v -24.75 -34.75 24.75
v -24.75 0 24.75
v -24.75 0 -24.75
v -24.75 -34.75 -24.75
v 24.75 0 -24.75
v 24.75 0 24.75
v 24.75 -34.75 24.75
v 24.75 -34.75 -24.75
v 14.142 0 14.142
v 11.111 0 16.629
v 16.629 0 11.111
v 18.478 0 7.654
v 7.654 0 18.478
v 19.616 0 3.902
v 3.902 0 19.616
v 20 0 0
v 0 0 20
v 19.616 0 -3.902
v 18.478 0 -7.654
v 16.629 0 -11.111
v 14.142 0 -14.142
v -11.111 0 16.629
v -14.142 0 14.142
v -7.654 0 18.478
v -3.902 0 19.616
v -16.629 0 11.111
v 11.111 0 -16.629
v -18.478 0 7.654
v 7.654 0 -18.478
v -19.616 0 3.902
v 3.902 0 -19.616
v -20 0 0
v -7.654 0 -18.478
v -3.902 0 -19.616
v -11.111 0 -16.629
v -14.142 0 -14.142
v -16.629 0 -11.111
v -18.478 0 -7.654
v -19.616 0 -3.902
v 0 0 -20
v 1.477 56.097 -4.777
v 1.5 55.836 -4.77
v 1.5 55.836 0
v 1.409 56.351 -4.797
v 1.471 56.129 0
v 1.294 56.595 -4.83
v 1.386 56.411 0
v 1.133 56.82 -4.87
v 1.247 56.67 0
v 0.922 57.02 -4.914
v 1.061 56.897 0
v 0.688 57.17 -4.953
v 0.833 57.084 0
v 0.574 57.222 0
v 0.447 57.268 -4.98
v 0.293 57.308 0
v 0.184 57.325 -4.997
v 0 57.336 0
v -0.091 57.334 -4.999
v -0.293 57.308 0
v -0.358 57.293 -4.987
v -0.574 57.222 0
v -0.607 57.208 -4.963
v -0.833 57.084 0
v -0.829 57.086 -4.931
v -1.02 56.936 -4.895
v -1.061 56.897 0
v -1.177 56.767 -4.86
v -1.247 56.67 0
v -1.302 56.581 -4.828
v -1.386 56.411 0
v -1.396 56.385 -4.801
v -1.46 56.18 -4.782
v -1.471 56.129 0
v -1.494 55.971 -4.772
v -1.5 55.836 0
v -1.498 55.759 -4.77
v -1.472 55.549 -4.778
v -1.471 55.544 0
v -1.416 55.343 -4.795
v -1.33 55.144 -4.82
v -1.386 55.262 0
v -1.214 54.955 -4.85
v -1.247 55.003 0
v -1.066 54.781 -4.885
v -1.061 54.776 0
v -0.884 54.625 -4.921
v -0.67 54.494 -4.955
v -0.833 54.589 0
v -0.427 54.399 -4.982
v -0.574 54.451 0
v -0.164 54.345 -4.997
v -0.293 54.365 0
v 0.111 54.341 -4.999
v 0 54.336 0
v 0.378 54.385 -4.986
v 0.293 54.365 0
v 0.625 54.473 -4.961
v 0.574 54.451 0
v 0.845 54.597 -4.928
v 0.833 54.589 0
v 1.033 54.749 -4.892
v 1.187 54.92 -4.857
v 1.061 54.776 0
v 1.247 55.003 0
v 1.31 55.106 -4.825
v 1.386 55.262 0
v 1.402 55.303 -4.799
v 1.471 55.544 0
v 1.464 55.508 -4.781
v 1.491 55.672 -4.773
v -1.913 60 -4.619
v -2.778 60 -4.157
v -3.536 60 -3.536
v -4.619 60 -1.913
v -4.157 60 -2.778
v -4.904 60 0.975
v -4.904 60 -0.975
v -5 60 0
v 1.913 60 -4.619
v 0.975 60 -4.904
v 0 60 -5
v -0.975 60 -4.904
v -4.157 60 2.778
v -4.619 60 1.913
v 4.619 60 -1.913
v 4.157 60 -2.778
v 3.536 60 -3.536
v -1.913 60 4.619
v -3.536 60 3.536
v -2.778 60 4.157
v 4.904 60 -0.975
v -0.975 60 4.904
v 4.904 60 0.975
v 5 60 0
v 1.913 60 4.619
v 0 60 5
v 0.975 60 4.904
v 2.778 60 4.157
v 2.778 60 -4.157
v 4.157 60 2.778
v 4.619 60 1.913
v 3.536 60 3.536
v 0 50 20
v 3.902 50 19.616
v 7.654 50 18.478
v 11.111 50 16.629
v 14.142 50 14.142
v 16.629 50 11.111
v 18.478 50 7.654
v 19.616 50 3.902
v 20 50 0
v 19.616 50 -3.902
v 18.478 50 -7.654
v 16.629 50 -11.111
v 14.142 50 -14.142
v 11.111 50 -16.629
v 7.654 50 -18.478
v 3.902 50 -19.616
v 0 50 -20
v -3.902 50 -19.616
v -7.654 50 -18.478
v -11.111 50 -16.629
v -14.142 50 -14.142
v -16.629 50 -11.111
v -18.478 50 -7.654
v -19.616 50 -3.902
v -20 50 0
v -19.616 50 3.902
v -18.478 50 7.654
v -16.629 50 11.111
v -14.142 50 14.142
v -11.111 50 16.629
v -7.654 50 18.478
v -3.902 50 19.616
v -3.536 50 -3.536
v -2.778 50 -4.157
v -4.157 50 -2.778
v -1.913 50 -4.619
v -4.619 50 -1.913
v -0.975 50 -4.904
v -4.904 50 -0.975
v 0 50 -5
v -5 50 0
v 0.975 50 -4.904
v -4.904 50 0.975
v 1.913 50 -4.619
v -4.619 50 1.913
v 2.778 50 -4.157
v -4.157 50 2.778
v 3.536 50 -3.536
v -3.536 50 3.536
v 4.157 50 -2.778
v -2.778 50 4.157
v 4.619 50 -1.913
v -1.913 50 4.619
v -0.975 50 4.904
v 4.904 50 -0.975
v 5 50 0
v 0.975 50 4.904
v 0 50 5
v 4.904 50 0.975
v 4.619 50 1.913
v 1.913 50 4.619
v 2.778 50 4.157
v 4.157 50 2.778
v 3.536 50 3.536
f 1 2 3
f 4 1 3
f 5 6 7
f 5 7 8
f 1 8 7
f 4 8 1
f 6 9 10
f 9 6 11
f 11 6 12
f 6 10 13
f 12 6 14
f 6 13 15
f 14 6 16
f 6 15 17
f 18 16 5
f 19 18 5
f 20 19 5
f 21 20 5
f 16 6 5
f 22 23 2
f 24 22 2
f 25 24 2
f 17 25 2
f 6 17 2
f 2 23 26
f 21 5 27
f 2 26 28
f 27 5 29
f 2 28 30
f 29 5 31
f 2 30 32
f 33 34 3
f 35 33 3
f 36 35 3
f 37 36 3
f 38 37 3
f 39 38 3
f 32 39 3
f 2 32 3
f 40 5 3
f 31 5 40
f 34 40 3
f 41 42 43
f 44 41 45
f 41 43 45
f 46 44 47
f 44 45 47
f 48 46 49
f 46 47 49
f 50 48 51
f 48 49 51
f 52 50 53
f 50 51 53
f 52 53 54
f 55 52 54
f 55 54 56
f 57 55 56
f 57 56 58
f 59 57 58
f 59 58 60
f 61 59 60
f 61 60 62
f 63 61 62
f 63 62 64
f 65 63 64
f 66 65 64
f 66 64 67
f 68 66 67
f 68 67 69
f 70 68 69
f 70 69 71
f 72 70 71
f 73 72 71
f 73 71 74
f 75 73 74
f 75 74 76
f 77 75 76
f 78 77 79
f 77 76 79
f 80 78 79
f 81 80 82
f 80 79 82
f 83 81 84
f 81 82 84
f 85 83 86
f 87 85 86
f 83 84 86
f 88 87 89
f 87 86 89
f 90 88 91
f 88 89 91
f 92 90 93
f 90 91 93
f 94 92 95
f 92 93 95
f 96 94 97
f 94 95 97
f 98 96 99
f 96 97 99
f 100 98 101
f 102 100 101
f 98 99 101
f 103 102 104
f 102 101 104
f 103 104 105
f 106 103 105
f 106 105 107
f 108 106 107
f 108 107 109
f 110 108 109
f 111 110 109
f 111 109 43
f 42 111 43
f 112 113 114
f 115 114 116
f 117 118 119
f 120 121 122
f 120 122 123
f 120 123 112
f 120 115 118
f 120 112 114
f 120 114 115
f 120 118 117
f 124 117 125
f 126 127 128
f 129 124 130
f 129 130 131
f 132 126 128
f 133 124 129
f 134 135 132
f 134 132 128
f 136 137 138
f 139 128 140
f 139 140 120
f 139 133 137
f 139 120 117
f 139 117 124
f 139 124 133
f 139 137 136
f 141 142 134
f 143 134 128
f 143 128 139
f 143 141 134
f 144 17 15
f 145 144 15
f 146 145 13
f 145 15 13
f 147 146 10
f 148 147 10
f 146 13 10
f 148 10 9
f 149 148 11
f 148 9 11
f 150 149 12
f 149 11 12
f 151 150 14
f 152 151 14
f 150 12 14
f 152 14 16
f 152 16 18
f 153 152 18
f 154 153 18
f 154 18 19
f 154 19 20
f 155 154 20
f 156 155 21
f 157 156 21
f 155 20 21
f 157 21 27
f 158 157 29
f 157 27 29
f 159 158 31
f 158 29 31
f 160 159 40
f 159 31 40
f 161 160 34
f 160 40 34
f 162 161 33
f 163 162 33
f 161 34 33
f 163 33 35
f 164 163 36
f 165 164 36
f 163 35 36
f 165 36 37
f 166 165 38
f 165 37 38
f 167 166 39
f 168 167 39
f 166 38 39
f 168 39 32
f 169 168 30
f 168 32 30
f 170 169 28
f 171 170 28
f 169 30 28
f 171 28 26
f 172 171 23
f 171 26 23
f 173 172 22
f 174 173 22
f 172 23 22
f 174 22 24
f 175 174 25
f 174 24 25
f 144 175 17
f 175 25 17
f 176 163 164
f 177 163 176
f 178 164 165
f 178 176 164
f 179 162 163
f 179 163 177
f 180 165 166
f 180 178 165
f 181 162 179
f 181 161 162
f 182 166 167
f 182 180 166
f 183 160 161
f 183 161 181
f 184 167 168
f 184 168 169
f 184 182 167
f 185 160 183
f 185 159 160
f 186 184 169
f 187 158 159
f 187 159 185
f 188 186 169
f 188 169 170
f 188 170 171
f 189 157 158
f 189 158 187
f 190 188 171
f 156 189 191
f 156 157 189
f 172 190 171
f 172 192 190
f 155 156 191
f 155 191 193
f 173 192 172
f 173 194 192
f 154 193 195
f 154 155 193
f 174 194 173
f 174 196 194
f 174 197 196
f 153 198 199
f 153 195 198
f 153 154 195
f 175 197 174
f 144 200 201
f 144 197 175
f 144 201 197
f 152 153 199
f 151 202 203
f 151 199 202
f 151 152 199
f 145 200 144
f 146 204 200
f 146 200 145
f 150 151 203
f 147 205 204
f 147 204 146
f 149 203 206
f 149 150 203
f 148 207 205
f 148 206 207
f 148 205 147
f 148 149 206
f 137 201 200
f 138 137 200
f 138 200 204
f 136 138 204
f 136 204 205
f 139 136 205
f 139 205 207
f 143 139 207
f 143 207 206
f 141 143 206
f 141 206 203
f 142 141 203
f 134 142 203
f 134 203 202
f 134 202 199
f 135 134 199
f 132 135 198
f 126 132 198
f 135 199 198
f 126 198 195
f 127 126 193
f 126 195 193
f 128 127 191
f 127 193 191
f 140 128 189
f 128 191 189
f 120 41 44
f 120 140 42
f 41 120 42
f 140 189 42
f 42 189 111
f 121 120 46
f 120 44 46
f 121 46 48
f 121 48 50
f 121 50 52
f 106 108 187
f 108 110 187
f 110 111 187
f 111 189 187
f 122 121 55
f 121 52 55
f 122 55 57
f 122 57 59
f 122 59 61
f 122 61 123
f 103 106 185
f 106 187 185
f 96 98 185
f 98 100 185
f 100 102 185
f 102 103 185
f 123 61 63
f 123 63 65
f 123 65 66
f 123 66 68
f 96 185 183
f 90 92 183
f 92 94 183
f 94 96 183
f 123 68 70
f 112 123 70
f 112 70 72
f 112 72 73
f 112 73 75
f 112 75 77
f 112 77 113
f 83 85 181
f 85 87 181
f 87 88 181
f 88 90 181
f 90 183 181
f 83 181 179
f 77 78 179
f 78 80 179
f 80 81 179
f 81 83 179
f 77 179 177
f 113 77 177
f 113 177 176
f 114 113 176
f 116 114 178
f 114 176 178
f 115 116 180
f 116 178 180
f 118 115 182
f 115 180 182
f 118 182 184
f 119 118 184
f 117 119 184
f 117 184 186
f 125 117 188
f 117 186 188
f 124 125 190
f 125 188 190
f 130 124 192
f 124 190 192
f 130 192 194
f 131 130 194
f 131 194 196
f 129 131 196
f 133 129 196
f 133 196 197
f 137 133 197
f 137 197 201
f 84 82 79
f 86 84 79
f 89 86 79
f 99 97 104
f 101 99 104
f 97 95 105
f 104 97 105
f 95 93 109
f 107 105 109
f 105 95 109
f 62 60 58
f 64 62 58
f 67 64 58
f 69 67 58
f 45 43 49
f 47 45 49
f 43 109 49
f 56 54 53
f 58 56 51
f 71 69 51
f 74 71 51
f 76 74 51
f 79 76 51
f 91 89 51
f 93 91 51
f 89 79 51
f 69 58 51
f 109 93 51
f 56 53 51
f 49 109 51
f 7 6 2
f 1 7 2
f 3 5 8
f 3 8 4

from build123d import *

# Parameters (mm, degrees)
SKETCH1_R           = 20
BOSS_EXTRUDE1_DEPTH = 50
SKETCH2_R           = 5
BOSS_EXTRUDE2_DEPTH = 10
SKETCH3_R           = 1.5
CUT_EXTRUDE1_DEPTH  = 16
SKETCH4_W           = 49.5
SKETCH4_H           = 49.5
BOSS_EXTRUDE3_DEPTH = 34.75


with BuildPart() as part:
    # Sketch1 → Boss-Extrude1 (new body)
    with BuildSketch(Plane(origin=(0, 0, 0), x_dir=(1, 0, 0), z_dir=(0, 1, 0))):
        with Locations(Location((0, 0, 0), (0, 0, 270))):
            Circle(SKETCH1_R)
    extrude(amount=BOSS_EXTRUDE1_DEPTH)

    # Sketch2 → Boss-Extrude2 (add)
    with BuildSketch(Plane(origin=(0, 50, 0), x_dir=(1, 0, 0), z_dir=(0, 1, 0))):
        with Locations(Location((0, 0, 0), (0, 0, 270))):
            Circle(SKETCH2_R)
    extrude(amount=BOSS_EXTRUDE2_DEPTH)

    # Sketch3 → Cut-Extrude1 (cut)
    with BuildSketch(Plane.XY):
        with Locations((0, 55.836490144)):
            Circle(SKETCH3_R)
    extrude(amount=-CUT_EXTRUDE1_DEPTH, mode=Mode.SUBTRACT)

    # Sketch4 → Boss-Extrude3 (add)
    with BuildSketch(Plane(origin=(0, 0, 0), x_dir=(-1, 0, 0), z_dir=(0, -1, 0))):
        Rectangle(SKETCH4_W, SKETCH4_H)
    extrude(amount=BOSS_EXTRUDE3_DEPTH)


solid = part.part
